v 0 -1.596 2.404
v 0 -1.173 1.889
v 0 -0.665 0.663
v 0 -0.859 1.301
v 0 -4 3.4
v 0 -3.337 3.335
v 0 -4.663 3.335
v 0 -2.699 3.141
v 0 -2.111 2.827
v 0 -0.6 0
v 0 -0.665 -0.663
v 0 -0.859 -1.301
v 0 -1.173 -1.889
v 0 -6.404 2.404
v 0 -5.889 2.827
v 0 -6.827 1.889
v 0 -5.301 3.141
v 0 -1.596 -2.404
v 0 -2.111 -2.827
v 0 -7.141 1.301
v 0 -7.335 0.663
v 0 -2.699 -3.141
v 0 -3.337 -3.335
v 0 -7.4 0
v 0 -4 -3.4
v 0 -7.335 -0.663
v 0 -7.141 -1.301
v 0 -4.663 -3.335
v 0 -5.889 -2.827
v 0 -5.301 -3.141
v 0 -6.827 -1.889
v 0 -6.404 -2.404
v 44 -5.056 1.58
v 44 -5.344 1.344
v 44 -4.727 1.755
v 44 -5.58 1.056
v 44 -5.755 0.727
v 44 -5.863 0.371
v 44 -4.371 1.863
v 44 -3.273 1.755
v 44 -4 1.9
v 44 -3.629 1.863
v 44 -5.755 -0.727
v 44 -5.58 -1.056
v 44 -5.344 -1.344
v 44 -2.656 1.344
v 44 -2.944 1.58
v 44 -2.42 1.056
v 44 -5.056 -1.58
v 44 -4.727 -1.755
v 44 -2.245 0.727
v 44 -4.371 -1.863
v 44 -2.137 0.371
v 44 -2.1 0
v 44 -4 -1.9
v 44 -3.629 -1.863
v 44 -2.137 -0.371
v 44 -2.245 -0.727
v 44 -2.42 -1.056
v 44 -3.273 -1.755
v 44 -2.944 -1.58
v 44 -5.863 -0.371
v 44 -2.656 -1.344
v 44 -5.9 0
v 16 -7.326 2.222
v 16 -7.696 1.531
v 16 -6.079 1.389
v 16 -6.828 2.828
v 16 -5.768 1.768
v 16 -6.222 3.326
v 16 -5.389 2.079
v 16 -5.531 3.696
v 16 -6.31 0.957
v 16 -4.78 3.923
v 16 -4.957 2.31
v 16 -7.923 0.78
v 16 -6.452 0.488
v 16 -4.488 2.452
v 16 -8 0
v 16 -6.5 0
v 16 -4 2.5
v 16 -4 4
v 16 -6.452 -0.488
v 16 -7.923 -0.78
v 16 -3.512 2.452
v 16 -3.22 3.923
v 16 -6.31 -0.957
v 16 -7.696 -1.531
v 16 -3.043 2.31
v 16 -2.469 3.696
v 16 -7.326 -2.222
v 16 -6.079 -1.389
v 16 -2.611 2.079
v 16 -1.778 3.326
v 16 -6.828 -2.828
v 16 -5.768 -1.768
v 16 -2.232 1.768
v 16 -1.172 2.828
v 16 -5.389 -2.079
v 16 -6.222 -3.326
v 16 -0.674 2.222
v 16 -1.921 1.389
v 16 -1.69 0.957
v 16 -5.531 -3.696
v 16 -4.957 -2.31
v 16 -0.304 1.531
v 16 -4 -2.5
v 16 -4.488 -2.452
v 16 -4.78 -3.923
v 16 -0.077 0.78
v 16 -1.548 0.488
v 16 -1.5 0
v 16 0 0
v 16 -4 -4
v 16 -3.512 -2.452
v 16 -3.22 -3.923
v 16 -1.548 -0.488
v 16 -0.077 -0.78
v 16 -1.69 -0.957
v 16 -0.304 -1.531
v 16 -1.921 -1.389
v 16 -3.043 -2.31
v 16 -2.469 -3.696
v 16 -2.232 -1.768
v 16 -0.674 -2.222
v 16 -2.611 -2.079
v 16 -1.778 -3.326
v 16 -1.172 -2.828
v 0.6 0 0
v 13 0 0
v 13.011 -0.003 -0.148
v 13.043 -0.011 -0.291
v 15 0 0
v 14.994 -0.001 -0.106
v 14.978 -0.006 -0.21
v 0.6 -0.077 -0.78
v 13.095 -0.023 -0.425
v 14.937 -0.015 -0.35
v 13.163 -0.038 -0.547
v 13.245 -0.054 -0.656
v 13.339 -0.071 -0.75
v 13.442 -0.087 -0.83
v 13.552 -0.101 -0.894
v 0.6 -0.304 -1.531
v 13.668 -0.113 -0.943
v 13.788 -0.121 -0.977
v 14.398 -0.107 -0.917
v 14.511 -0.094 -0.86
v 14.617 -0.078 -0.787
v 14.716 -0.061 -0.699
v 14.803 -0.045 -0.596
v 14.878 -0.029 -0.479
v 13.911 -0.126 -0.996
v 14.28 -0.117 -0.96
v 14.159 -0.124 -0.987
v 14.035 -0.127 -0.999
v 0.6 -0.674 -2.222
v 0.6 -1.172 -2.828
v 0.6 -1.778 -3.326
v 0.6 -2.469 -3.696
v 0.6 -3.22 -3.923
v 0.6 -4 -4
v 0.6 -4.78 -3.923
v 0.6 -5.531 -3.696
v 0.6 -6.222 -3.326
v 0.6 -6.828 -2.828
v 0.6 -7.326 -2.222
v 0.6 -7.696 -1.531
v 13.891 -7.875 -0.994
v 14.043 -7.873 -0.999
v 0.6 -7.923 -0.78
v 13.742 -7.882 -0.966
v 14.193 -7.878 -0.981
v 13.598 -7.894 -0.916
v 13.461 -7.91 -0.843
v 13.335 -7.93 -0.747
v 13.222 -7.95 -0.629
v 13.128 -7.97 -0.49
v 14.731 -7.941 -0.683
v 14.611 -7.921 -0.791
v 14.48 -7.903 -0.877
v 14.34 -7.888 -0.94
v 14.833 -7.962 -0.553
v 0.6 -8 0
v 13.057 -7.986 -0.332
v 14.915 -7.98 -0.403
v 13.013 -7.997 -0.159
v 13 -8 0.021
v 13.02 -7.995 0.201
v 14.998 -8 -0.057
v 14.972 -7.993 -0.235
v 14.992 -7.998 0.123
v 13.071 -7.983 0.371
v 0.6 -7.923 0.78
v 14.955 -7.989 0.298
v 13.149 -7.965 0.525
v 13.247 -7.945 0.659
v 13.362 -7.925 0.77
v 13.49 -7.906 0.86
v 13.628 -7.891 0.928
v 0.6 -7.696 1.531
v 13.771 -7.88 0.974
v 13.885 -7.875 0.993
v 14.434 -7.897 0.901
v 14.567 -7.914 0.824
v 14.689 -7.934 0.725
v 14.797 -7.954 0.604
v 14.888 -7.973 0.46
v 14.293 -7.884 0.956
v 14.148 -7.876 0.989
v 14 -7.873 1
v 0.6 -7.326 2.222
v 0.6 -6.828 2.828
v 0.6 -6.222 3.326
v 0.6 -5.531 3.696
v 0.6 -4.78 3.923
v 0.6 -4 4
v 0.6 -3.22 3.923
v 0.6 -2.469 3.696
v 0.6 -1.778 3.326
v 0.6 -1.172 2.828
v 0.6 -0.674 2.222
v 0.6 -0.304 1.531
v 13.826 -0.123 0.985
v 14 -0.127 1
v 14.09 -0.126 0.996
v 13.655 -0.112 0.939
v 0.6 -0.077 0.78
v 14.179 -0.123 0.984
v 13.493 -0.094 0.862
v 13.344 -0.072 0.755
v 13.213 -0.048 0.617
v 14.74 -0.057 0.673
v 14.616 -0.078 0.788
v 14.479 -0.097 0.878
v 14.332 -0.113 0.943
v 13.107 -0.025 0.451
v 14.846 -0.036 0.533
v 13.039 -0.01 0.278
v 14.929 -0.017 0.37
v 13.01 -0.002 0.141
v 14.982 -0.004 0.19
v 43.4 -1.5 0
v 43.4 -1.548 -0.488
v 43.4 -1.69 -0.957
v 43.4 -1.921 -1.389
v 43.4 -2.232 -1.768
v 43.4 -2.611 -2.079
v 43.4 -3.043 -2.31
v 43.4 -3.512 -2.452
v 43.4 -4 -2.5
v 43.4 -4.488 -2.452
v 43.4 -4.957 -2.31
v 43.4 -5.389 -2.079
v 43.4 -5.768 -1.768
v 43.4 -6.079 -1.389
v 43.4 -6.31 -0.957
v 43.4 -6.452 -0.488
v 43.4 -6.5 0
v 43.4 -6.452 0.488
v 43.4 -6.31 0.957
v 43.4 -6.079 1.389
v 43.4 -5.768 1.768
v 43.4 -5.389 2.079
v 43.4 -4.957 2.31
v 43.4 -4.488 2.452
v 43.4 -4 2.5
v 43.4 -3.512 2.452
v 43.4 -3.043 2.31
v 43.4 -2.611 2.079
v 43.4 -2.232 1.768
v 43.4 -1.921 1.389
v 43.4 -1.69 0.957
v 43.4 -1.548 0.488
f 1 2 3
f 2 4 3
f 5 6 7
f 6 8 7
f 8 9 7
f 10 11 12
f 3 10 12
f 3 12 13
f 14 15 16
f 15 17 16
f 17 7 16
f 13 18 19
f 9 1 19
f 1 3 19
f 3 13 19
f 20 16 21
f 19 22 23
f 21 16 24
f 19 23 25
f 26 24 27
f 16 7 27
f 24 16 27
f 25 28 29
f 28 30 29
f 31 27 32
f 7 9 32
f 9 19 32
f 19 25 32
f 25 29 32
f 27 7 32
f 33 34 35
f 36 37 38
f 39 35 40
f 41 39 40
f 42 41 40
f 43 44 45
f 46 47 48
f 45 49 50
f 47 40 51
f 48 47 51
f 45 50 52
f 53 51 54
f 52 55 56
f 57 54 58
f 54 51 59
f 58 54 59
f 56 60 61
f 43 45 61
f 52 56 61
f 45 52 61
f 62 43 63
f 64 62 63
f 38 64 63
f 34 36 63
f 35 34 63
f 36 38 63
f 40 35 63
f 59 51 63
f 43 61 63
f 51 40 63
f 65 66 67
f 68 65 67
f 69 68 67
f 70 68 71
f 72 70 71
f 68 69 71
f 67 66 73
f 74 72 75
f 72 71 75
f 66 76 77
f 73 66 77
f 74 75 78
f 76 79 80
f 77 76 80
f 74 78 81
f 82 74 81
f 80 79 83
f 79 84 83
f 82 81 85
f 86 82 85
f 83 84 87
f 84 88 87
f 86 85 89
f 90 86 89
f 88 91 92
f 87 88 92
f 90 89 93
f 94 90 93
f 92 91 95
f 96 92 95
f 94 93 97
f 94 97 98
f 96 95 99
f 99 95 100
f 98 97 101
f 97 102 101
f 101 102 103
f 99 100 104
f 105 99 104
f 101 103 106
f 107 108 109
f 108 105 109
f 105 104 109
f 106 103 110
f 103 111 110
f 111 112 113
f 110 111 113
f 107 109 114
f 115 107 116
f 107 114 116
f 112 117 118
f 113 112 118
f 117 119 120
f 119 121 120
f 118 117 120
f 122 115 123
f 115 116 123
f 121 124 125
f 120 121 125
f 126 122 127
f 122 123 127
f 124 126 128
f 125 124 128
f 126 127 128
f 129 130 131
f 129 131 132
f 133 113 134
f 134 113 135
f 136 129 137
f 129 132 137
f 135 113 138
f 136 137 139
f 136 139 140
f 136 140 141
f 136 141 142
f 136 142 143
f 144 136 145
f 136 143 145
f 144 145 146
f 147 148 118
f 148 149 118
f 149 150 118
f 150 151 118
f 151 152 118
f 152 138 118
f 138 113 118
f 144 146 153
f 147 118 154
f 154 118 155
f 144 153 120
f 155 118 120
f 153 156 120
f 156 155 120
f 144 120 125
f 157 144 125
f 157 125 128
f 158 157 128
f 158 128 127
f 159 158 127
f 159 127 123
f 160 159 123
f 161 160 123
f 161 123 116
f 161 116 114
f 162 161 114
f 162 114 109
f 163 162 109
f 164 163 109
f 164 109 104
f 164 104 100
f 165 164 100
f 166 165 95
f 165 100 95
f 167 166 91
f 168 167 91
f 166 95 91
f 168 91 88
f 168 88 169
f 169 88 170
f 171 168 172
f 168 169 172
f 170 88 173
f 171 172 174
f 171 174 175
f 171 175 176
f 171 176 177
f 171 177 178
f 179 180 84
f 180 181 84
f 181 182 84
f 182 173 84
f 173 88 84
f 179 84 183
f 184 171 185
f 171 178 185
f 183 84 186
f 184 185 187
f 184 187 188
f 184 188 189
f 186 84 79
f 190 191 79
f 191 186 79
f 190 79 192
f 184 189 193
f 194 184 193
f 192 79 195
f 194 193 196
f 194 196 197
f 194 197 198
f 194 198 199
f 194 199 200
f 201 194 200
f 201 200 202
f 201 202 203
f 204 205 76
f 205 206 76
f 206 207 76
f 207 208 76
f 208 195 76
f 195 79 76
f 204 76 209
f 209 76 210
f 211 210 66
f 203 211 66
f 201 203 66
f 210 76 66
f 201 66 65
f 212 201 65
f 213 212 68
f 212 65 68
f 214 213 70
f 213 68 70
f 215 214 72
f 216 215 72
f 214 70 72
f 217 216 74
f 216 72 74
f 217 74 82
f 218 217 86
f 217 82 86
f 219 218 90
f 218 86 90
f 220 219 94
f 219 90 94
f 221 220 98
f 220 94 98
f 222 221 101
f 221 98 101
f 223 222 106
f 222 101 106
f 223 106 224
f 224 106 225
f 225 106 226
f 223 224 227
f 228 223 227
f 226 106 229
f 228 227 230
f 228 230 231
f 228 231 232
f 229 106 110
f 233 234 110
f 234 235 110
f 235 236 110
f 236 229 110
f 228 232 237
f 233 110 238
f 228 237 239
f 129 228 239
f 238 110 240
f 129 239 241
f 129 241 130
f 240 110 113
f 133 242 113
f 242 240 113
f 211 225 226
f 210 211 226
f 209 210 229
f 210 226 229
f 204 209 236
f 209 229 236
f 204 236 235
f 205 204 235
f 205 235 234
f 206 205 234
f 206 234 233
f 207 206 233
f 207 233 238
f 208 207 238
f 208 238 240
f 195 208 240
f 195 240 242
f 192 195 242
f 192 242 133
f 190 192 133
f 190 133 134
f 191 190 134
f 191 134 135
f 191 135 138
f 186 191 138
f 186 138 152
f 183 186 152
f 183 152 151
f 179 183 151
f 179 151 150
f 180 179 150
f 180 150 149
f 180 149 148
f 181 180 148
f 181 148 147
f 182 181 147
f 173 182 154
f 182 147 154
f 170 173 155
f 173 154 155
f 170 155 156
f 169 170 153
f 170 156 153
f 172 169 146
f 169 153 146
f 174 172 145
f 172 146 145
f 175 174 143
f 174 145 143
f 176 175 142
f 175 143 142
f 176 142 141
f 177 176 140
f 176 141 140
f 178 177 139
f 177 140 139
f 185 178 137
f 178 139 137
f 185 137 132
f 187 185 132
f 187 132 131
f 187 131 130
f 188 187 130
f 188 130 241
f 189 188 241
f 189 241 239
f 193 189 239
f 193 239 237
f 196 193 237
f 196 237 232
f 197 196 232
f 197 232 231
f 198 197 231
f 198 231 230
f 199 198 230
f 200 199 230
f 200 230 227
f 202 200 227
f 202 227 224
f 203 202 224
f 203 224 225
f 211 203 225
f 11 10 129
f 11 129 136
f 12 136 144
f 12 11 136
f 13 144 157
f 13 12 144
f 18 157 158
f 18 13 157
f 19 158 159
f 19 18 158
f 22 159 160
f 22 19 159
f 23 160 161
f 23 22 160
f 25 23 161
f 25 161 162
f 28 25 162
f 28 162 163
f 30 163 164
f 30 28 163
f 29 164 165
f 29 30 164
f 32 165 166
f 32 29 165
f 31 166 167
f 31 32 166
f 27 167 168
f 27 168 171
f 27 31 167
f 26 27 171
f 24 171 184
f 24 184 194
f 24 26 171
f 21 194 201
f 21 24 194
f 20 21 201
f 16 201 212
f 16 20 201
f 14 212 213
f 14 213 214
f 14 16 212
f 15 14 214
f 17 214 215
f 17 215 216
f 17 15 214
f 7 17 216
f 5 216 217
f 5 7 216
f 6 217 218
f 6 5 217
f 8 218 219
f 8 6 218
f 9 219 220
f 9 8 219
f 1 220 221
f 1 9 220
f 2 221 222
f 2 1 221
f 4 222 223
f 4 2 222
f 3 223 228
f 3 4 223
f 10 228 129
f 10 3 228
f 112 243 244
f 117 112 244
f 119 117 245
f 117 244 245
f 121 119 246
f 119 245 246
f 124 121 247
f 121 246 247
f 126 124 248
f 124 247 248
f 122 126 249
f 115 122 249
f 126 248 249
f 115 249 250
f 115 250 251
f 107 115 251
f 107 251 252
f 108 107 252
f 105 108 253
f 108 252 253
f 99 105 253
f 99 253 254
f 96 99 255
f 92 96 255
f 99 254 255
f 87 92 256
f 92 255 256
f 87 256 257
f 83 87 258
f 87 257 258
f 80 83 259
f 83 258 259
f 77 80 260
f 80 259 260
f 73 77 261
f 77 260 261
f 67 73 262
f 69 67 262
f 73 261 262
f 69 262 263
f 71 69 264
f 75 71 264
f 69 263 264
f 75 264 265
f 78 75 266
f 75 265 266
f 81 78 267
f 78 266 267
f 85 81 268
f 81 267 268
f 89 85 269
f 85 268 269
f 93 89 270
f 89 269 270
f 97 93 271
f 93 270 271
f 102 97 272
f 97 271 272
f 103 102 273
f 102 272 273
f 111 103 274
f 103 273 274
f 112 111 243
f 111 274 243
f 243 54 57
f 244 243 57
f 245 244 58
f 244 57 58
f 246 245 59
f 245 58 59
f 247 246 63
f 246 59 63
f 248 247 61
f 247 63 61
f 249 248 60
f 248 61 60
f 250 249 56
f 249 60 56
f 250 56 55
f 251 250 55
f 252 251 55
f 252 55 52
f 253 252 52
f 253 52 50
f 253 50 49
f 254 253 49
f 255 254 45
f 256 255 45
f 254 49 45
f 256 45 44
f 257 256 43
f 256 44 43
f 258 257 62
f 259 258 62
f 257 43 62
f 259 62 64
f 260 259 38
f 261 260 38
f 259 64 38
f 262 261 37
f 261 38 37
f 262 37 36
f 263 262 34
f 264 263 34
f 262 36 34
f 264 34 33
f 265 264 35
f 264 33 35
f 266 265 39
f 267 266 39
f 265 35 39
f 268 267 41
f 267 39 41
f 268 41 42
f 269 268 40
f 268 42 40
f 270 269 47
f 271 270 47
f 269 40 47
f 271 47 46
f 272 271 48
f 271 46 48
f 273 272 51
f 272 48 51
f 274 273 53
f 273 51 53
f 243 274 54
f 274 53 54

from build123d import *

# Parameters (mm, degrees)
CHAMFER_1_SIZE           = 0.6
CUT_EXTRUDE_1_REACH      = 46.9
CUT_EXTRUDE_1_END_RADIUS = 4
SKETCH_2_R               = 1


with BuildPart() as part:
    # Эскиз1 → Повернуть1 (revolve)
    with BuildSketch(Plane.XY):
        Polygon((0, 0), (16, 0), (16, -1.5), (44, -1.5), (44, -4), (0, -4), align=None)
    revolve(axis=Axis((44, -4, 0), (-1, 0, 0)))

    # Фаска1
    chamfer_1_edges = [part.edges().sort_by_distance(p)[0] for p in [
        (44, -6.5, 0),
        (0, -8, 0),
    ]]
    chamfer(chamfer_1_edges, length=CHAMFER_1_SIZE)

    # Вырез-Вытянуть1: up to this cylinder (the profile starts inside it)
    cut_extrude_1_end = Plane(origin=(14, -4, 0), z_dir=(1, 0, 0)) * Cylinder(CUT_EXTRUDE_1_END_RADIUS, 102.8, mode=Mode.PRIVATE)
    # Эскиз2 → Вырез-Вытянуть1 (cut, up to the surface)
    with BuildSketch(Plane(origin=(0, 0, 0), x_dir=(1, 0, 0), z_dir=(0, 1, 0)), mode=Mode.PRIVATE) as cut_extrude_1_sk1:
        with Locations(Location((14, 0, 0), (0, 0, 270))):
            Circle(SKETCH_2_R)
    cut_extrude_1_tool1 = extrude(cut_extrude_1_sk1.sketch, amount=-CUT_EXTRUDE_1_REACH, mode=Mode.PRIVATE) & cut_extrude_1_end
    add(cut_extrude_1_tool1.solids().sort_by_distance((14, 0, 0))[0], mode=Mode.SUBTRACT)


solid = part.part
